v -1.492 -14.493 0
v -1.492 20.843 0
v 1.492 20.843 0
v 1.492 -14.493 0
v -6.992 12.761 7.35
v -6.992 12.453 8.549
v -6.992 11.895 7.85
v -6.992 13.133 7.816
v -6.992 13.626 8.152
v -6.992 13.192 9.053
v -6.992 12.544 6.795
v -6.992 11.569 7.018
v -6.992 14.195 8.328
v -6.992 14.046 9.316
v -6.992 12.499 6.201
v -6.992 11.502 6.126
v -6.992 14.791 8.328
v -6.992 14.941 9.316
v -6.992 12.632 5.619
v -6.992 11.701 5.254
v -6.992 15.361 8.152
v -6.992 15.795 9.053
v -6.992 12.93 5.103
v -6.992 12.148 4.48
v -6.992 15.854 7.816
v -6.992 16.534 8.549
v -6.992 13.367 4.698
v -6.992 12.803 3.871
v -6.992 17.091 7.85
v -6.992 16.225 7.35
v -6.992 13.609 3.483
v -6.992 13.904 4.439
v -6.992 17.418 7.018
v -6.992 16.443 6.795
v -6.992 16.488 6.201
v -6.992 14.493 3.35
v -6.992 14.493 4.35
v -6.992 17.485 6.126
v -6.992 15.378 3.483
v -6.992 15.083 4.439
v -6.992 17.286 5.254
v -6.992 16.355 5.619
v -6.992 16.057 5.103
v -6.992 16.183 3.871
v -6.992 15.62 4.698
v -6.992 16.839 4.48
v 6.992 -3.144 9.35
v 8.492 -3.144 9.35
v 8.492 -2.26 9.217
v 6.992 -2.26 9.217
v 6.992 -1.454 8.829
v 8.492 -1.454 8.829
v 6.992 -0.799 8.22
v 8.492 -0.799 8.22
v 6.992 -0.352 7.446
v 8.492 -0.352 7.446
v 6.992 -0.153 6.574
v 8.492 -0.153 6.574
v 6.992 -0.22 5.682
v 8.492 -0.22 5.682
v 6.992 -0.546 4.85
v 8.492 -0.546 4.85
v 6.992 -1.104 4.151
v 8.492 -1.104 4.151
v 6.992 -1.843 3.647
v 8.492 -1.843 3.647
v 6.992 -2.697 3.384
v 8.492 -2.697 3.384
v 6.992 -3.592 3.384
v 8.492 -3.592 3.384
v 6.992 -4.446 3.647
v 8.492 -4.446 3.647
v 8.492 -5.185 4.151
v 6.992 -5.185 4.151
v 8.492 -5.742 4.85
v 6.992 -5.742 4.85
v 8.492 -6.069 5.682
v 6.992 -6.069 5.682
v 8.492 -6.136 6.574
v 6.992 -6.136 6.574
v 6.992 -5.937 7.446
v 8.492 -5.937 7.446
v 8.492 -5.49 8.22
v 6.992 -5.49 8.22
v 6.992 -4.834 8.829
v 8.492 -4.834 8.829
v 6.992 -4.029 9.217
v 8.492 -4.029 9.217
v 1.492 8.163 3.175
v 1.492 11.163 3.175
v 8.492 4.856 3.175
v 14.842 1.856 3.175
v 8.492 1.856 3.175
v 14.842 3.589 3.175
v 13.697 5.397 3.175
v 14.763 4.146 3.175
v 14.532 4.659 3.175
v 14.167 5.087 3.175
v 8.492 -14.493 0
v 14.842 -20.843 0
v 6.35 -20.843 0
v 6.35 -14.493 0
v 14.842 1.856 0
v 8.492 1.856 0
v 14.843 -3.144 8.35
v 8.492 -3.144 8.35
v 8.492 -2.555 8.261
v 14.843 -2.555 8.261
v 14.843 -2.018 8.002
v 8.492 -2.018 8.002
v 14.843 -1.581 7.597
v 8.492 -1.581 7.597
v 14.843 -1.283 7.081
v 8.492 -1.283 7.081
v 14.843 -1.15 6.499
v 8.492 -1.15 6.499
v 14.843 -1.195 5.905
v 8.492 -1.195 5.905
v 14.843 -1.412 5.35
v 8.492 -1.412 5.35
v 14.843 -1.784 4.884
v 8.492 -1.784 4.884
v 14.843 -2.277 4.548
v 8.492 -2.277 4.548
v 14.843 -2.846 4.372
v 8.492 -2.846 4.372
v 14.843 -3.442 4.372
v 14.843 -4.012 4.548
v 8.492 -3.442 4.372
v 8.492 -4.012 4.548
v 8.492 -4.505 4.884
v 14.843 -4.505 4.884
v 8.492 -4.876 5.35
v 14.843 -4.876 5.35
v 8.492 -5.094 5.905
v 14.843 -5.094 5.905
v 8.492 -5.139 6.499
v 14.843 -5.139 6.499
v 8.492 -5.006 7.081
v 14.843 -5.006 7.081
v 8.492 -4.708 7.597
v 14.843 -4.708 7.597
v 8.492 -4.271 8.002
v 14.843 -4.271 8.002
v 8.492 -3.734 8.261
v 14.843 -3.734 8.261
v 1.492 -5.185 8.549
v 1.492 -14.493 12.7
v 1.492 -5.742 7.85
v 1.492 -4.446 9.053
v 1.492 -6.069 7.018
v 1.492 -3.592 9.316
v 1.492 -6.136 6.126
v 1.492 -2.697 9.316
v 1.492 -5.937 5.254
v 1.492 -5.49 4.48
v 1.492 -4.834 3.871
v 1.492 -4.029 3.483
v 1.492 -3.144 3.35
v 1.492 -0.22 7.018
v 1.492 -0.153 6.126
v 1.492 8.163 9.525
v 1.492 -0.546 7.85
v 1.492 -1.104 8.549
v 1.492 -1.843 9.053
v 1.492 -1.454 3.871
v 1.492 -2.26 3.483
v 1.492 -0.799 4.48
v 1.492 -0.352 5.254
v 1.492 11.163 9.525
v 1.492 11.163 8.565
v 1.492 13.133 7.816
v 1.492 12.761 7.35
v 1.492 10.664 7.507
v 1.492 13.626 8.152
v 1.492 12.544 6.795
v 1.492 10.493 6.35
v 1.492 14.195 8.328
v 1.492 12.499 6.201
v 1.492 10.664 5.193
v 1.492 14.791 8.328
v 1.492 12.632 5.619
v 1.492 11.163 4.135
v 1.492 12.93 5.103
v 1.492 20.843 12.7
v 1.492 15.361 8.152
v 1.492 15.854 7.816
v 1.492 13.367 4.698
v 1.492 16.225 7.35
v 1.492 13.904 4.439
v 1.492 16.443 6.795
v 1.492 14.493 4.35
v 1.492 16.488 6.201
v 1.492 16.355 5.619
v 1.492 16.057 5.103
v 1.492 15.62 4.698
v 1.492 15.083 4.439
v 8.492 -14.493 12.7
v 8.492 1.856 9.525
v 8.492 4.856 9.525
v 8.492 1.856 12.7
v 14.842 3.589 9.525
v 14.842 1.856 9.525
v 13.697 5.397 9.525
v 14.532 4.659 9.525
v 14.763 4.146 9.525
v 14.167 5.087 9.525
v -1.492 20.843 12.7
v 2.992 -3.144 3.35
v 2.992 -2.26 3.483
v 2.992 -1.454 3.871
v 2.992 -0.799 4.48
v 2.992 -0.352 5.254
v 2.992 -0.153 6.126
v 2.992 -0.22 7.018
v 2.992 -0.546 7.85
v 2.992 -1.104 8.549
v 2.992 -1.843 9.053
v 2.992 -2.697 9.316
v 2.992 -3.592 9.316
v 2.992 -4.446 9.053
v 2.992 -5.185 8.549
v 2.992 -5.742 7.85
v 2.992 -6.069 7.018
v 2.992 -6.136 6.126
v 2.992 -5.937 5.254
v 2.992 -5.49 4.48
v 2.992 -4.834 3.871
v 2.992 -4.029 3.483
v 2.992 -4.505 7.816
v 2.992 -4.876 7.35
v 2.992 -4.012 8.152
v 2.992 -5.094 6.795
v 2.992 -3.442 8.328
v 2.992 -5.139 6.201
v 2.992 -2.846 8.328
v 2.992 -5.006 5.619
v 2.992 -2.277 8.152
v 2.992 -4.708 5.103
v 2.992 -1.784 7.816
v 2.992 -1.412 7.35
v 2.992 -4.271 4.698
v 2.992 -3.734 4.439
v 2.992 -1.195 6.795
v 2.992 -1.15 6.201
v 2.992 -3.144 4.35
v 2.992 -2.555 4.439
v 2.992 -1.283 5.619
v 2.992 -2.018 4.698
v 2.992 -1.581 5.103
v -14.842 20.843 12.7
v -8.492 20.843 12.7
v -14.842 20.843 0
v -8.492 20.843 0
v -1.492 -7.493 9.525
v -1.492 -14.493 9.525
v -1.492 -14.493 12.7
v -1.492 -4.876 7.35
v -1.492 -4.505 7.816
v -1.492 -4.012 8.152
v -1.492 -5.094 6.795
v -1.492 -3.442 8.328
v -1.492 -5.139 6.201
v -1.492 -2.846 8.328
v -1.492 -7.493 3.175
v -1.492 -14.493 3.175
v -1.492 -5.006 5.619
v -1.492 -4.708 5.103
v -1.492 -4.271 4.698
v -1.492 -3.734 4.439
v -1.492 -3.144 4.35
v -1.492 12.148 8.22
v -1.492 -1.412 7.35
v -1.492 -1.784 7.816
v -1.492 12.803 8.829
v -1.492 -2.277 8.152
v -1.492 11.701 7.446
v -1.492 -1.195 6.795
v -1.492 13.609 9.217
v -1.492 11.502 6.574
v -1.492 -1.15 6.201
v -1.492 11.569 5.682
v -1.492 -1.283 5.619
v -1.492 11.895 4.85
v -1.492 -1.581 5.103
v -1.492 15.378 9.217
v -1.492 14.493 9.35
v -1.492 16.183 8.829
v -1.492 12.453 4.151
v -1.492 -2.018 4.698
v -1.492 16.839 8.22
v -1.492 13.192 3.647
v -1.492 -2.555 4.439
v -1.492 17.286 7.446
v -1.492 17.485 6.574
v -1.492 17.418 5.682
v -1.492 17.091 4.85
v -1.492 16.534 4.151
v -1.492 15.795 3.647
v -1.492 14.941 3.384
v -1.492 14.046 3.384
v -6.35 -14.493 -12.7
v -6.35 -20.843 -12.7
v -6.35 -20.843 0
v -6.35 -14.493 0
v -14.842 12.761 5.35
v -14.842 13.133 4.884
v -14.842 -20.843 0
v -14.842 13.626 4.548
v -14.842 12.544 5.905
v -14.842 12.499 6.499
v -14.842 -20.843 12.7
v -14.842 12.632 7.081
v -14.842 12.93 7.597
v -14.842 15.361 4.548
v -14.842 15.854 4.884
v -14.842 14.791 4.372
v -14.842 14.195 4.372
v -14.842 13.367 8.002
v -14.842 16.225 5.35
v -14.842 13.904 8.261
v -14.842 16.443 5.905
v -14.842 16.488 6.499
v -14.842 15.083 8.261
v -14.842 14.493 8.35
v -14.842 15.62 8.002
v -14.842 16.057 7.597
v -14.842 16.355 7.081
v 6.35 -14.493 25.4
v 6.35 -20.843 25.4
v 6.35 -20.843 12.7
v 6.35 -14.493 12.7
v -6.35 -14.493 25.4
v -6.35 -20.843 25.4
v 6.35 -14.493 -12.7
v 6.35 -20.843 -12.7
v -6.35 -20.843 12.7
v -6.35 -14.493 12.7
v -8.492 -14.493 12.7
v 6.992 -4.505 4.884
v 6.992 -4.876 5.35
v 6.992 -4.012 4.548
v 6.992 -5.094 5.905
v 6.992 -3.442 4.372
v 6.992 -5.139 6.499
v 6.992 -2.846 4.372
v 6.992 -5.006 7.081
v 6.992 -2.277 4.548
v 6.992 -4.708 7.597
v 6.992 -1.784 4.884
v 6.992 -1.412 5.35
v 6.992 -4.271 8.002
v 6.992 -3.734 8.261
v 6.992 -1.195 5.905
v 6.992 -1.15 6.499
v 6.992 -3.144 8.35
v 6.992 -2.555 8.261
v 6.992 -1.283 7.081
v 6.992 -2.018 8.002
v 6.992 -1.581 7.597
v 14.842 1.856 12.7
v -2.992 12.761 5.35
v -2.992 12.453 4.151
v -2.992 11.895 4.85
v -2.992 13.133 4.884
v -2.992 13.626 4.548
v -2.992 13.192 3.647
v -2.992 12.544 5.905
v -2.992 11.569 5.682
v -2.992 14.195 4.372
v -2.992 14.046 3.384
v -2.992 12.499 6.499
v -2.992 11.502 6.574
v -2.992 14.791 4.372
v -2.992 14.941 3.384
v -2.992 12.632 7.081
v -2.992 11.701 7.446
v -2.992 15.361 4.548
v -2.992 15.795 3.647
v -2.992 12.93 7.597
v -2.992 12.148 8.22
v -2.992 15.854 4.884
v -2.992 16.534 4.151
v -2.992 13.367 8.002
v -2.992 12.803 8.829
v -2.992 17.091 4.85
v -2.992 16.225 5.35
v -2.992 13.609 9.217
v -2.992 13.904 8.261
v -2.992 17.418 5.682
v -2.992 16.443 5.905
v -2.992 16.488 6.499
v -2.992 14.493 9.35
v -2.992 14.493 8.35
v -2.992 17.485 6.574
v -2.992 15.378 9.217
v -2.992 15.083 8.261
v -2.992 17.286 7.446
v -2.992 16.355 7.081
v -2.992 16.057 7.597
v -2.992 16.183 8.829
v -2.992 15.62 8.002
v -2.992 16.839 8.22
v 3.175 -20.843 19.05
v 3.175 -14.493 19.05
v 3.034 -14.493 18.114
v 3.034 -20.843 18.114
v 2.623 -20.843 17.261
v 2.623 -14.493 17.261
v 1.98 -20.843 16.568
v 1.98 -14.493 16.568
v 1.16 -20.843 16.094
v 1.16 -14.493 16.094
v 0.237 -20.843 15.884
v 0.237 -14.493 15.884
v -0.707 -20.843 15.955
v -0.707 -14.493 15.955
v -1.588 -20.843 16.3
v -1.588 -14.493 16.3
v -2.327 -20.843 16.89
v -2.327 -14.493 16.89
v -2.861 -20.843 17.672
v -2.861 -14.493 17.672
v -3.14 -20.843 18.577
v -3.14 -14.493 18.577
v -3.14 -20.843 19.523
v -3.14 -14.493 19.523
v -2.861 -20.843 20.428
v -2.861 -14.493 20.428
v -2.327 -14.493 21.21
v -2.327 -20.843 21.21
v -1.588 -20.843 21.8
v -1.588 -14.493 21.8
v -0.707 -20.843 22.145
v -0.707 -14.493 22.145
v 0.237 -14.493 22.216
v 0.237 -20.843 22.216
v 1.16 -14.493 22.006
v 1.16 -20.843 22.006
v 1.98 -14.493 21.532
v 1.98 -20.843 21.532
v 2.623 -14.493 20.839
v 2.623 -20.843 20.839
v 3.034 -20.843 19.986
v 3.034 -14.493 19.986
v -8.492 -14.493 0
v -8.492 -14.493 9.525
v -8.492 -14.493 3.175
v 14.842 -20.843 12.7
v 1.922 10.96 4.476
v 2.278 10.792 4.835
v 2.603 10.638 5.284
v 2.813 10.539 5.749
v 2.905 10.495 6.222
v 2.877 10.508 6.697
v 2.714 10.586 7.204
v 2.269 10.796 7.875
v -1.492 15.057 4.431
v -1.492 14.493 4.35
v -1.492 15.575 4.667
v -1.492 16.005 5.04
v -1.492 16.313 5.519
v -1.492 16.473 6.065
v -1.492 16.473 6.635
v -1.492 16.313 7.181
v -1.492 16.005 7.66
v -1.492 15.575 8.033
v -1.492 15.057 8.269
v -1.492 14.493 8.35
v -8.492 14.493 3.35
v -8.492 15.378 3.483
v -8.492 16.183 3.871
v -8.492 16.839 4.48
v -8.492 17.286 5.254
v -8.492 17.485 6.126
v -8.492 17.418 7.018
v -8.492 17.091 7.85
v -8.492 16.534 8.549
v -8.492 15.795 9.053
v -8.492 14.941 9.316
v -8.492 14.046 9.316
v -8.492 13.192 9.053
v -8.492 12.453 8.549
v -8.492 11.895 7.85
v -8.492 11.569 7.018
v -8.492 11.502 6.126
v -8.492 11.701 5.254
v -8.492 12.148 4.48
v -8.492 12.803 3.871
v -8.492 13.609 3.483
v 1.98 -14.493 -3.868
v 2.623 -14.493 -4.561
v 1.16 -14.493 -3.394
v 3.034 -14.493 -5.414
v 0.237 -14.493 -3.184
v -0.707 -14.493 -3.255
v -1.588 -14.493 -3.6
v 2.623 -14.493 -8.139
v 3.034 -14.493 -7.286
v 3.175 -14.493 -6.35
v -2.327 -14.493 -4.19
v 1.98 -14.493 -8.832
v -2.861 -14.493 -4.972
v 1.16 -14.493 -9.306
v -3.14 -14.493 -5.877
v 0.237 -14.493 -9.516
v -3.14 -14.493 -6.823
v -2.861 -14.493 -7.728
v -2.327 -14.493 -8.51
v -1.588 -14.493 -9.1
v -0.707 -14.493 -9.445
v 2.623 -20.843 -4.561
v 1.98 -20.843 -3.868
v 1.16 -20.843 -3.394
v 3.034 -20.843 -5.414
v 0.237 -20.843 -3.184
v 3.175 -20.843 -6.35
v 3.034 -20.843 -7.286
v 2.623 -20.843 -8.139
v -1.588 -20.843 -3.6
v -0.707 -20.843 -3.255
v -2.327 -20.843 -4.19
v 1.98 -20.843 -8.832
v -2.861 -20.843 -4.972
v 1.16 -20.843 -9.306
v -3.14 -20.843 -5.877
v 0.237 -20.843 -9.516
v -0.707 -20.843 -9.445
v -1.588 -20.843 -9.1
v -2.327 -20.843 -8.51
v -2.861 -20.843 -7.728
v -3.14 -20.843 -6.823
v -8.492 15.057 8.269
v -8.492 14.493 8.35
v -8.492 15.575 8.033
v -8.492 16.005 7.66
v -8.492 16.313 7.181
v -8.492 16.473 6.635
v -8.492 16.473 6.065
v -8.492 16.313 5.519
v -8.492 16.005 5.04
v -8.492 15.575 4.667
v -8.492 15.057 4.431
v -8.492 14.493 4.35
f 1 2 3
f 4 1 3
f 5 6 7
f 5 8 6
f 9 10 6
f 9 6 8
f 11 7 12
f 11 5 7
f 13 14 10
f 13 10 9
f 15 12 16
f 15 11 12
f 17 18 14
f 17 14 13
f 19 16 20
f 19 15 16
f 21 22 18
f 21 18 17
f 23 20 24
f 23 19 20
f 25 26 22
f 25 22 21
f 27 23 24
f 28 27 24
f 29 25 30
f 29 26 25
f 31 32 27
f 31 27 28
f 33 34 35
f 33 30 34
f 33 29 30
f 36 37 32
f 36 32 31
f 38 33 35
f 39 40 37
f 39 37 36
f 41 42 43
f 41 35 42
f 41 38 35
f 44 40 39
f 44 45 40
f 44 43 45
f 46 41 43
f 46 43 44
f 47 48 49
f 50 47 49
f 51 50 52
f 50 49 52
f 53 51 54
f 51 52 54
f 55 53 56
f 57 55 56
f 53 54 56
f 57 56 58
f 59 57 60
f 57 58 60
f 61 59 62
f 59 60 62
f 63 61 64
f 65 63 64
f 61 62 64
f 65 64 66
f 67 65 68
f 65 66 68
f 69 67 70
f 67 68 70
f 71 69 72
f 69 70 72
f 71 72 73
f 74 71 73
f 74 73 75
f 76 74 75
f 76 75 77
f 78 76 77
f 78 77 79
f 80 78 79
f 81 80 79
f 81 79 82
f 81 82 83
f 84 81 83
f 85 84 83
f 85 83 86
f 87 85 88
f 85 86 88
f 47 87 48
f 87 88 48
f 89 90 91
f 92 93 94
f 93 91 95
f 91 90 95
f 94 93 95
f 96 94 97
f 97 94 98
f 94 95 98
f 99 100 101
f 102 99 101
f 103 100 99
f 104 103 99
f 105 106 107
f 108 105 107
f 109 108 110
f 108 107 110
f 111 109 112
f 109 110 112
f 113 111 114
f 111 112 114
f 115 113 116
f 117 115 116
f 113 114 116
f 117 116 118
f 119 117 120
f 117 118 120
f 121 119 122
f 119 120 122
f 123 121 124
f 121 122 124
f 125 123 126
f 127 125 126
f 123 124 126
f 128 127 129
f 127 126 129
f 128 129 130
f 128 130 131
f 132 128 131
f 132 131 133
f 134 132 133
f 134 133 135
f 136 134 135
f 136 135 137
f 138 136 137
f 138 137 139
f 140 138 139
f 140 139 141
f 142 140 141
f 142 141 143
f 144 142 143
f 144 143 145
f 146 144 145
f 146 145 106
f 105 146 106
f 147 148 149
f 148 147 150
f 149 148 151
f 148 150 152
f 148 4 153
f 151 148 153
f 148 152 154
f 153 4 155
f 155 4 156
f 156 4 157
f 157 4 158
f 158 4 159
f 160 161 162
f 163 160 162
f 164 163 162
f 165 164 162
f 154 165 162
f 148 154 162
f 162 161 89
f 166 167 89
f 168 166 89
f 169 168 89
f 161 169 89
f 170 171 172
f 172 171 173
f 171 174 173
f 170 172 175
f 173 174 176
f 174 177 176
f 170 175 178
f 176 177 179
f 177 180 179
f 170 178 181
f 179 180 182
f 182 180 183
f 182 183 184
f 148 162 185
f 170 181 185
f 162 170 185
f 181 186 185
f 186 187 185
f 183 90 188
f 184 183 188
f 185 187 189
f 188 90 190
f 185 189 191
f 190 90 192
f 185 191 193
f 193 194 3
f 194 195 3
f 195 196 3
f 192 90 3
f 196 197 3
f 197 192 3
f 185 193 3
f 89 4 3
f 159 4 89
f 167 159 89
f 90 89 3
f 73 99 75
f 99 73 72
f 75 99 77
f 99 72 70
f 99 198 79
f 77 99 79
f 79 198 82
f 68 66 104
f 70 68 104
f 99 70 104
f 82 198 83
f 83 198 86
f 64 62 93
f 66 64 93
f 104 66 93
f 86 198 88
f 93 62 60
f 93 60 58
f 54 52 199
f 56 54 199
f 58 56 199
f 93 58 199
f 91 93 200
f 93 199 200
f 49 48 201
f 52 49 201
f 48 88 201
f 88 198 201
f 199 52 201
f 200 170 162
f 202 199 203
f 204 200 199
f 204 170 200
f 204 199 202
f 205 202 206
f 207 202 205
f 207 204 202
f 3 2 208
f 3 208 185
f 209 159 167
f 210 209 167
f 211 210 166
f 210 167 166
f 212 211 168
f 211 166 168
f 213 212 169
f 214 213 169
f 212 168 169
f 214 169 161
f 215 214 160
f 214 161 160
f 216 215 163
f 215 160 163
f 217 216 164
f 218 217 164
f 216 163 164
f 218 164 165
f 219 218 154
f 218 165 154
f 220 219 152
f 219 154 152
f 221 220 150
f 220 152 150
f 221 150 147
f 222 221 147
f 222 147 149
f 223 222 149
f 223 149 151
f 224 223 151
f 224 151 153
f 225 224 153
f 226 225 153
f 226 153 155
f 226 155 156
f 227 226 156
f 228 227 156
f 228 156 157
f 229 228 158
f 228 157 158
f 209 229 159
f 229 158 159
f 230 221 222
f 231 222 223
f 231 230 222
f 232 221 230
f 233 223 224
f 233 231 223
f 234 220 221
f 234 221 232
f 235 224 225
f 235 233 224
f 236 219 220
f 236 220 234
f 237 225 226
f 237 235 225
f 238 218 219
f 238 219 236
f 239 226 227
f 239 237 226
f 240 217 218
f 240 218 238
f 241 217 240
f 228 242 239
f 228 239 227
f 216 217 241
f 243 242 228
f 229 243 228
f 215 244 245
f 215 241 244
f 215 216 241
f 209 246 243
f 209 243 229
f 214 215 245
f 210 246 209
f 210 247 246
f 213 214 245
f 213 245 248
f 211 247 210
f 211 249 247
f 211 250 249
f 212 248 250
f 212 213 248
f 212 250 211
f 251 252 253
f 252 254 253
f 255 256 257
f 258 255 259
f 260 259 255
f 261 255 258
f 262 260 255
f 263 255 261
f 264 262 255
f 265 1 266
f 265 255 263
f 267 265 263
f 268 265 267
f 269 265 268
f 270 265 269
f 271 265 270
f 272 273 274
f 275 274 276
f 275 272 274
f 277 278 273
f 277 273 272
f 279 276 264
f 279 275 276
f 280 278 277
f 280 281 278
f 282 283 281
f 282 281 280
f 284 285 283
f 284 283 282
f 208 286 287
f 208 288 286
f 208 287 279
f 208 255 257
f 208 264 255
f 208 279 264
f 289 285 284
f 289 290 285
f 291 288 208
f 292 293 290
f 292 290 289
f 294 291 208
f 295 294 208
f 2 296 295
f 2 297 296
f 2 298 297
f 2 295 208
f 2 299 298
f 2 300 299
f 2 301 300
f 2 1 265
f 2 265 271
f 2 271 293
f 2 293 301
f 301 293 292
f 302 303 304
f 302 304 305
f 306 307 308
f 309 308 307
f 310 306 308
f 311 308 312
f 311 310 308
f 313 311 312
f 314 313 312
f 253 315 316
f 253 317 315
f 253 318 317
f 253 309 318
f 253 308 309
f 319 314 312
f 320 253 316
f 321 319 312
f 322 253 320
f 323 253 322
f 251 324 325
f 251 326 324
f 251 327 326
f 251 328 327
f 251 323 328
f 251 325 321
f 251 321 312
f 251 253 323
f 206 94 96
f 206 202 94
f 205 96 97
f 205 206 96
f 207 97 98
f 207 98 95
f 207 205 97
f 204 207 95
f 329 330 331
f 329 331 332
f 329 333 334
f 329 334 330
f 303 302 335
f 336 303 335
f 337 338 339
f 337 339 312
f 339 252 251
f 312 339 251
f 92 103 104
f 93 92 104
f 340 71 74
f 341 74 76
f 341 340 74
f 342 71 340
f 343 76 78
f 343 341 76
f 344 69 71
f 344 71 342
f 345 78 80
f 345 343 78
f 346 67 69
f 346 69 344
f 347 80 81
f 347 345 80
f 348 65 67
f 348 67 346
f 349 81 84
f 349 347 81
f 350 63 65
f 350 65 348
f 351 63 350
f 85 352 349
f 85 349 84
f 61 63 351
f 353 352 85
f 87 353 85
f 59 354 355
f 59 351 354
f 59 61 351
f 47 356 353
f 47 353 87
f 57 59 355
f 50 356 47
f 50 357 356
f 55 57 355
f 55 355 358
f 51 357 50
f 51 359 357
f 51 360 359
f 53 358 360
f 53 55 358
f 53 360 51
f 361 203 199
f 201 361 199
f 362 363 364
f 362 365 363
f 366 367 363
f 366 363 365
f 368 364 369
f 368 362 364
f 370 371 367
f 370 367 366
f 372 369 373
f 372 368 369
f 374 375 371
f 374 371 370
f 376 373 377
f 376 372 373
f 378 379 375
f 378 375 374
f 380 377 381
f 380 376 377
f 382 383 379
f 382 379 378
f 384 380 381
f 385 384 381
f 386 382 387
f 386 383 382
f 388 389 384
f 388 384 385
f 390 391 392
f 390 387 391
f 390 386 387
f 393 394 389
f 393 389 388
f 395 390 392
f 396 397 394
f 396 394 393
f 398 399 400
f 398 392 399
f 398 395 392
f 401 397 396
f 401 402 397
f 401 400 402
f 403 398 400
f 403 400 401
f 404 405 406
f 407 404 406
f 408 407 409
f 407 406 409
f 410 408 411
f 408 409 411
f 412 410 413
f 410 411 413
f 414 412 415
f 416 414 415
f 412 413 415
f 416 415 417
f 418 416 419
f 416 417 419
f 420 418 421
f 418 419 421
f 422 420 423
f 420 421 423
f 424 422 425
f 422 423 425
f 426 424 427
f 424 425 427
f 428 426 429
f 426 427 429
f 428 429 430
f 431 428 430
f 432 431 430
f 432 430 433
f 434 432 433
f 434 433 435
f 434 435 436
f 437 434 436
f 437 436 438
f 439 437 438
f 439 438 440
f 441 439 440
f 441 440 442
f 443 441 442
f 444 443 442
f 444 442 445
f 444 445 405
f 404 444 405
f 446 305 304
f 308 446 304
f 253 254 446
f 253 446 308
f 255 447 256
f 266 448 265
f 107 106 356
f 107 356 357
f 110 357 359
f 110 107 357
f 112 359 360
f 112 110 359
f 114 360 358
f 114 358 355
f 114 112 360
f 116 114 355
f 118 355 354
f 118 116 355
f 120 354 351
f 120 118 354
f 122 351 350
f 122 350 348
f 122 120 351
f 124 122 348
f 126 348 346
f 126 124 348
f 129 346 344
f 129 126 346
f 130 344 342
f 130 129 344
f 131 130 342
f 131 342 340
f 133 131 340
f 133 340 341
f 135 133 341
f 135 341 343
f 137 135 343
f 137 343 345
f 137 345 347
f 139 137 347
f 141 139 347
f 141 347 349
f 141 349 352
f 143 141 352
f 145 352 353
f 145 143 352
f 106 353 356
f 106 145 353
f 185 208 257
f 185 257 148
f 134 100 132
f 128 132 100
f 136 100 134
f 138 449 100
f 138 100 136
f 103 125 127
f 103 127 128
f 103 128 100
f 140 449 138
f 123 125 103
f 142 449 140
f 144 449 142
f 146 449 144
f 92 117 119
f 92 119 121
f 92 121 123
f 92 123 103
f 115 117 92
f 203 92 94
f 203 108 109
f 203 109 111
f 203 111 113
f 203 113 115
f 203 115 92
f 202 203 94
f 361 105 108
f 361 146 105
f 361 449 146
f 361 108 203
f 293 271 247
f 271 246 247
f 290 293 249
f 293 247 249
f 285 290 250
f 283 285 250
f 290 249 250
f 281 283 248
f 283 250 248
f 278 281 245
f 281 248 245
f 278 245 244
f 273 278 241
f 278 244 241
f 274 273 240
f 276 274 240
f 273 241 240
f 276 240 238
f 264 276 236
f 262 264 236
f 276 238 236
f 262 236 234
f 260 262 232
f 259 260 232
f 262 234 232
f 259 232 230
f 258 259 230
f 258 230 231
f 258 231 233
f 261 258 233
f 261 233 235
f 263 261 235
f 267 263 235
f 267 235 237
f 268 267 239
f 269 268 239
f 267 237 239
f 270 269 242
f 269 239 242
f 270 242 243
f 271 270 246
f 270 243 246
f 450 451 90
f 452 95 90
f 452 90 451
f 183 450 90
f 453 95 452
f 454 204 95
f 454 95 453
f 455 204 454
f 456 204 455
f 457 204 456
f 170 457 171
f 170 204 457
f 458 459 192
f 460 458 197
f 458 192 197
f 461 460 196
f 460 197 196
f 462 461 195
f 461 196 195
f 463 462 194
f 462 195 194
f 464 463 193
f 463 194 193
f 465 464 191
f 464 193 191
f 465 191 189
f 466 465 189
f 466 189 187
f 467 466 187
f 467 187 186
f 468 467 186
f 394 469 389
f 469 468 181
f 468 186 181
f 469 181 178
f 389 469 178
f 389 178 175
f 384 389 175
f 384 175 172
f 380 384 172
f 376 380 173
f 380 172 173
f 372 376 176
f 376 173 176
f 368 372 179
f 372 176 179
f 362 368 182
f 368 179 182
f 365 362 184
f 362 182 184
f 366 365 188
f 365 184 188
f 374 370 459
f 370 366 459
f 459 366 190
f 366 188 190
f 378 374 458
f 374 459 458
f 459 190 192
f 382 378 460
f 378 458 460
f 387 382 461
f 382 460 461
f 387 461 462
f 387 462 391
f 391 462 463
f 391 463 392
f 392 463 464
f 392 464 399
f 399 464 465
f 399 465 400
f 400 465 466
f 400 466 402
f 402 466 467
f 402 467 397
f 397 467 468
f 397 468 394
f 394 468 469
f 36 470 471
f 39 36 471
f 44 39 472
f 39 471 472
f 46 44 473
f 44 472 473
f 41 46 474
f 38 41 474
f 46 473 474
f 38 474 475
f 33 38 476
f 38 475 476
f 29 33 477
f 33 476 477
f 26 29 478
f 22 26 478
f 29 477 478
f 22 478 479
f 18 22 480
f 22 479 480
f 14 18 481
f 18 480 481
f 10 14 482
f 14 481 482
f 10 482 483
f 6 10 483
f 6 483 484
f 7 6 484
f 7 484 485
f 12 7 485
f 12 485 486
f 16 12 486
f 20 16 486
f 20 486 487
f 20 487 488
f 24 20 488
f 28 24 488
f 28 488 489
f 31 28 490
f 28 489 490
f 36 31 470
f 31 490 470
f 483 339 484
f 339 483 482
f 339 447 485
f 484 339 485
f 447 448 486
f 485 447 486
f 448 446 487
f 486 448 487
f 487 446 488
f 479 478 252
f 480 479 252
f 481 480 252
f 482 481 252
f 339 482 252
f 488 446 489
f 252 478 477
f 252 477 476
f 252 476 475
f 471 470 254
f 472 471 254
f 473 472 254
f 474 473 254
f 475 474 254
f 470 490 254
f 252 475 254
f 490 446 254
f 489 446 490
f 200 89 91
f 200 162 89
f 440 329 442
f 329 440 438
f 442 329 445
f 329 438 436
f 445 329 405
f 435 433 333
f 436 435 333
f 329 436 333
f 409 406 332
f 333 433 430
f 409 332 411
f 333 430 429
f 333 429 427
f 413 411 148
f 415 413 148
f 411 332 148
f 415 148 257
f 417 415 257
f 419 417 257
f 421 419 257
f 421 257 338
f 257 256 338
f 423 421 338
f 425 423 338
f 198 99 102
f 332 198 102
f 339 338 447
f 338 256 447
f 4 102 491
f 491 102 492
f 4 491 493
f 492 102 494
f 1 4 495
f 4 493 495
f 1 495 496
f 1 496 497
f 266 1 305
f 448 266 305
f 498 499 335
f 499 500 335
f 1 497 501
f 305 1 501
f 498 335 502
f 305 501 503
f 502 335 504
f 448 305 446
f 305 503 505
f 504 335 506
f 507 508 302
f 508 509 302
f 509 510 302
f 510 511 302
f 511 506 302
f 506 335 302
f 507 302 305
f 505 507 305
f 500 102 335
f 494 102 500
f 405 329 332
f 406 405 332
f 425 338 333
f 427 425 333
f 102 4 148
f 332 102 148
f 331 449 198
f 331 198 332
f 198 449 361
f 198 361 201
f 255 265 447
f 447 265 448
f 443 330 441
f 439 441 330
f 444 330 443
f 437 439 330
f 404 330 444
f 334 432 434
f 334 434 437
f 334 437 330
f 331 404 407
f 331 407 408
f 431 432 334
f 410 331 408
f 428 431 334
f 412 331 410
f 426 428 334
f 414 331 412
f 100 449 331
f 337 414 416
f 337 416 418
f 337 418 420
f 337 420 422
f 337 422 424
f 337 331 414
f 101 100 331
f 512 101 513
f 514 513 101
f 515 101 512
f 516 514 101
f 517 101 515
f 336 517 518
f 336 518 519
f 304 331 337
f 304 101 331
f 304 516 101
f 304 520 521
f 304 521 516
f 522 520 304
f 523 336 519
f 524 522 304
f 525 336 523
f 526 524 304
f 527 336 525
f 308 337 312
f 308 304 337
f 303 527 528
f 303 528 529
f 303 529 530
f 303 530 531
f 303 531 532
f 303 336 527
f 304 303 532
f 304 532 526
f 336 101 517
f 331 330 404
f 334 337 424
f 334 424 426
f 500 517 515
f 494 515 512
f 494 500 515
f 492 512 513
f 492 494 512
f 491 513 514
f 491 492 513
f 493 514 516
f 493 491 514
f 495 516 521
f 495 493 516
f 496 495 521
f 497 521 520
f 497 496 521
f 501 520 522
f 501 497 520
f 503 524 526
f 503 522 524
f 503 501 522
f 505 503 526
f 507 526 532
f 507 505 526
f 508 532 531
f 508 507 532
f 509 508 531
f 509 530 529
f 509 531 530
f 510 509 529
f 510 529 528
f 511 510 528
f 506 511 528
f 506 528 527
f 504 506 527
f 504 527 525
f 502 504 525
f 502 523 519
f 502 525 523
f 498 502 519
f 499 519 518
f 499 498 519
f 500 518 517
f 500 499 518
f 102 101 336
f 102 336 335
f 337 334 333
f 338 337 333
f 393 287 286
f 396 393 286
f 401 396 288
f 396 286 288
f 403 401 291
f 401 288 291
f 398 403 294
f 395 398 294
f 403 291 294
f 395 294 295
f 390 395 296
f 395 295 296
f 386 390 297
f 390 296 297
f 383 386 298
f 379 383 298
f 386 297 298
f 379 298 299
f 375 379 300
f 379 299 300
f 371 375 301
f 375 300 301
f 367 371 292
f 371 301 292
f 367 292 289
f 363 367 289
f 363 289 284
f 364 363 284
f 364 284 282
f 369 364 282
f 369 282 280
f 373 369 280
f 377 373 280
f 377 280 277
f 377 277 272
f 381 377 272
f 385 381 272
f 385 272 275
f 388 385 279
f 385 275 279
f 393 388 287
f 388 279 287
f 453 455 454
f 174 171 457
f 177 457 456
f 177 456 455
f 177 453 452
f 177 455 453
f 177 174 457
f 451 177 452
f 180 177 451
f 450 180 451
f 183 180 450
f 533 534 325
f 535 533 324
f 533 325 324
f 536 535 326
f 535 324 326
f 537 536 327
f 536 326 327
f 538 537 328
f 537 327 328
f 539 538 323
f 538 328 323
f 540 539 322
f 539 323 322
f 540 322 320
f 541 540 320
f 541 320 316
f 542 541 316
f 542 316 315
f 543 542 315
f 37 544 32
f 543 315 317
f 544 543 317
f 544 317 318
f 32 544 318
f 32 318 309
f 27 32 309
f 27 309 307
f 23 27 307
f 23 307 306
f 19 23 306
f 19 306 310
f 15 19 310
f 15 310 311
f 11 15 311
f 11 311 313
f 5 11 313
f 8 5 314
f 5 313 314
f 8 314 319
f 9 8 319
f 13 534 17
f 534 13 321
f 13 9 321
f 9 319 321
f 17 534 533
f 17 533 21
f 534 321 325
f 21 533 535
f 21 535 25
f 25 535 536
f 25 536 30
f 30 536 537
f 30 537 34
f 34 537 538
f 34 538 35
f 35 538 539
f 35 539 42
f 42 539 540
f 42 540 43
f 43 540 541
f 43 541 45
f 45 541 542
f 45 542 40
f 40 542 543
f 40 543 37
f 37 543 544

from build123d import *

# Parameters (mm, degrees)
SKETCH1_W            = 2.984999904
SKETCH1_H            = 41.686759908
BOSS_EXTRUDE1_DEPTH  = 12.7
SKETCH5_R            = 2
CUT_EXTRUDE2_DEPTH   = 3.984999904
SKETCH8_W            = 12.7
SKETCH8_H            = 6.35
BOSS_EXTRUDE2_DEPTH  = 12.7
SKETCH9_R            = 3.175
CUT_EXTRUDE3_DEPTH   = 12.7
SKETCH11_W           = 12.7
SKETCH11_H           = 6.35
BOSS_EXTRUDE3_DEPTH  = 12.7
CUT_EXTRUDE4_REACH   = 9.842
SKETCH12_R           = 2
SKETCH15_R           = 3
SKETCH15_R_2         = 2
BOSS_EXTRUDE5_DEPTH  = 1.5
SKETCH16_R           = 3
SKETCH16_R_2         = 2
BOSS_EXTRUDE6_DEPTH  = 1.5
SKETCH13_W           = 6.35
SKETCH13_H           = 41.686759908
SKETCH13_W_2         = 7
SKETCH13_H_2         = 6.35
BOSS_EXTRUDE4_DEPTH  = 6.35
SKETCH17_R           = 2
CUT_EXTRUDE5_DEPTH   = 29.685
SKETCH18_R           = 3
SKETCH18_R_2         = 2
BOSS_EXTRUDE7_DEPTH  = 1.5
SKETCH19_R           = 3
SKETCH19_R_2         = 2
BOSS_EXTRUDE8_DEPTH  = 1.5
CUT_EXTRUDE6_REACH   = 27.4
SKETCH20_W           = 6.35
SKETCH20_H           = 18.98776
SKETCH21_R           = 2
BOSS_EXTRUDE9_DEPTH  = 6.35
BOSS_EXTRUDE10_DEPTH = 3.175
BOSS_EXTRUDE11_DEPTH = 3.175
SKETCH24_R           = 4
CUT_EXTRUDE8_DEPTH   = 6.35
FILLET3_R            = 2


with BuildPart() as part:
    # Sketch1 → Boss-Extrude1 (new body)
    with BuildSketch(Plane.XY):
        Rectangle(SKETCH1_W, SKETCH1_H)
    extrude(amount=BOSS_EXTRUDE1_DEPTH)

    # Sketch5 → Cut-Extrude2 (cut, through all)
    with BuildSketch(Plane(origin=(1.492499952, 0, 0), x_dir=(0, 0, -1), z_dir=(1, 0, 0))):
        with Locations((-6.35, 14.493379954)):
            Circle(SKETCH5_R)
    extrude(amount=-CUT_EXTRUDE2_DEPTH, mode=Mode.SUBTRACT)

    # Sketch8 → Boss-Extrude2 (add)
    with BuildSketch(Plane.XY.offset(12.7)):
        with Locations((0, -17.668379954)):
            Rectangle(SKETCH8_W, SKETCH8_H)
    boss_extrude2 = extrude(amount=BOSS_EXTRUDE2_DEPTH)

    # Sketch9 → Cut-Extrude3 (cut)
    with BuildSketch(Plane(origin=(0, -14.493379954, 0), x_dir=(1, 0, 0), z_dir=(0, 1, 0))):
        with Locations((0, -19.05)):
            Circle(SKETCH9_R)
    cut_extrude3 = extrude(amount=-CUT_EXTRUDE3_DEPTH, mode=Mode.SUBTRACT)

    # Mirror1: Boss-Extrude2, Cut-Extrude3 across plane
    add(boss_extrude2.mirror(Plane(origin=(0, 0, 6.35), x_dir=(1, 0, 0), z_dir=(0, 0, -1))))
    add(cut_extrude3.mirror(Plane(origin=(0, 0, 6.35), x_dir=(1, 0, 0), z_dir=(0, 0, -1))), mode=Mode.SUBTRACT)

    # Sketch11 → Boss-Extrude3 (add)
    with BuildSketch(Plane(origin=(0, 0, 12.7), x_dir=(-1, 0, 0), z_dir=(0, 0, -1))):
        with Locations((0, -17.668379954)):
            Rectangle(SKETCH11_W, SKETCH11_H)
    extrude(amount=BOSS_EXTRUDE3_DEPTH)

    # Sketch12 → Cut-Extrude4 (cut, up to next)
    with BuildSketch(Plane(origin=(1.492499952, 0, 0), x_dir=(0, 0, -1), z_dir=(1, 0, 0)), mode=Mode.PRIVATE) as cut_extrude4_sk1:
        with Locations((-6.35, -3.144380046)):
            Circle(SKETCH12_R)
    cut_extrude4_tool1 = extrude(cut_extrude4_sk1.sketch, amount=-CUT_EXTRUDE4_REACH, mode=Mode.PRIVATE) & part.part
    add(cut_extrude4_tool1.solids().sort_by_distance((1.4925, -3.14438, 6.35))[0], mode=Mode.SUBTRACT)

    # Sketch15 → Boss-Extrude5 (add)
    with BuildSketch(Plane.ZY.offset(1.492499952)):
        with Locations((6.35, 14.493379954)):
            Circle(SKETCH15_R)
        with Locations((6.35, 14.493379954)):
            Circle(SKETCH15_R_2, mode=Mode.SUBTRACT)
    extrude(amount=BOSS_EXTRUDE5_DEPTH)

    # Sketch16 → Boss-Extrude6 (add)
    with BuildSketch(Plane(origin=(1.492499952, 0, 0), x_dir=(0, 0, -1), z_dir=(1, 0, 0))):
        with Locations((-6.35, -3.144380046)):
            Circle(SKETCH16_R)
        with Locations((-6.35, -3.144380046)):
            Circle(SKETCH16_R_2, mode=Mode.SUBTRACT)
    extrude(amount=BOSS_EXTRUDE6_DEPTH)

    # Sketch13 → Boss-Extrude4 (add, symmetric)
    with BuildSketch(Plane(origin=(0, 0, 6.35), x_dir=(-1, 0, 0), z_dir=(0, 0, -1))):
        with Locations((-11.667499952, 0)):
            Rectangle(SKETCH13_W, SKETCH13_H)
        with Locations((-4.992499952, -17.668379954)):
            Rectangle(SKETCH13_W_2, SKETCH13_H_2)
        with Locations((11.667499952, 0)):
            Rectangle(SKETCH13_W, SKETCH13_H)
        with Locations((4.992499952, -17.668379954)):
            Rectangle(SKETCH13_W_2, SKETCH13_H_2)
    extrude(amount=BOSS_EXTRUDE4_DEPTH, both=True)

    # Sketch17 → Cut-Extrude5 (cut)
    with BuildSketch(Plane.ZY.offset(14.842499952)):
        with Locations((6.35, 14.493379954)):
            Circle(SKETCH17_R)
        with Locations((6.35, -3.144380046)):
            Circle(SKETCH17_R)
    extrude(amount=-CUT_EXTRUDE5_DEPTH, mode=Mode.SUBTRACT)

    # Sketch18 → Boss-Extrude7 (add)
    with BuildSketch(Plane.ZY.offset(-8.492499952)):
        with Locations((6.35, -3.144380046)):
            Circle(SKETCH18_R)
        with Locations((6.35, -3.144380046)):
            Circle(SKETCH18_R_2, mode=Mode.SUBTRACT)
    extrude(amount=BOSS_EXTRUDE7_DEPTH)

    # Sketch19 → Boss-Extrude8 (add)
    with BuildSketch(Plane(origin=(-8.492499952, 0, 0), x_dir=(0, 0, -1), z_dir=(1, 0, 0))):
        with Locations((-6.35, 14.493379954)):
            Circle(SKETCH19_R)
        with Locations((-6.35, 14.493379954)):
            Circle(SKETCH19_R_2, mode=Mode.SUBTRACT)
    extrude(amount=BOSS_EXTRUDE8_DEPTH)

    # Sketch20 → Cut-Extrude6 (cut, up to next)
    with BuildSketch(Plane(origin=(0, 0, 0), x_dir=(-1, 0, 0), z_dir=(0, 0, -1)), mode=Mode.PRIVATE) as cut_extrude6_sk1:
        with Locations((-11.667499952, 11.349499954)):
            Rectangle(SKETCH20_W, SKETCH20_H)
    cut_extrude6_tool1 = extrude(cut_extrude6_sk1.sketch, amount=-CUT_EXTRUDE6_REACH, mode=Mode.PRIVATE) & part.part
    add(cut_extrude6_tool1.solids().sort_by_distance((11.6675, 11.3495, 0))[0], mode=Mode.SUBTRACT)

    # Sketch21 → Boss-Extrude9 (add)
    with BuildSketch(Plane.ZY.offset(14.842499952)):
        with Locations((6.35, -3.144380046)):
            Circle(SKETCH21_R)
    extrude(amount=-BOSS_EXTRUDE9_DEPTH)

    # Sketch22 → Boss-Extrude10 (add, symmetric)
    with BuildSketch(Plane.XY.offset(6.35)):
        Polygon((8.492499952, 1.855619954), (14.842499952, 1.855619954), (14.842499952, 4.855619954), (1.492499952, 11.162706568), (1.492499952, 8.162706568), (8.492499952, 4.855619954), align=None)
    extrude(amount=BOSS_EXTRUDE10_DEPTH, both=True)

    # Sketch23 → Boss-Extrude11 (add, symmetric)
    with BuildSketch(Plane(origin=(0, 0, 6.35), x_dir=(-1, 0, 0), z_dir=(0, 0, -1))):
        Polygon((1.492499952, -7.493379954), (8.492499952, -14.493379954), (1.492499952, -14.493379954), align=None)
    extrude(amount=BOSS_EXTRUDE11_DEPTH, both=True)

    # Sketch24 → Cut-Extrude8 (cut)
    with BuildSketch(Plane(origin=(1.492499952, 0, 0), x_dir=(0, 0, -1), z_dir=(1, 0, 0))):
        with Locations((-6.35, 14.493379954)):
            Circle(SKETCH24_R)
    extrude(amount=CUT_EXTRUDE8_DEPTH, mode=Mode.SUBTRACT)

    # Fillet3
    fillet3_edges = [part.edges().sort_by_distance(p)[0] for p in [
        (14.842499952, 4.855619954, 6.35),
    ]]
    fillet(fillet3_edges, radius=FILLET3_R)


solid = part.part
